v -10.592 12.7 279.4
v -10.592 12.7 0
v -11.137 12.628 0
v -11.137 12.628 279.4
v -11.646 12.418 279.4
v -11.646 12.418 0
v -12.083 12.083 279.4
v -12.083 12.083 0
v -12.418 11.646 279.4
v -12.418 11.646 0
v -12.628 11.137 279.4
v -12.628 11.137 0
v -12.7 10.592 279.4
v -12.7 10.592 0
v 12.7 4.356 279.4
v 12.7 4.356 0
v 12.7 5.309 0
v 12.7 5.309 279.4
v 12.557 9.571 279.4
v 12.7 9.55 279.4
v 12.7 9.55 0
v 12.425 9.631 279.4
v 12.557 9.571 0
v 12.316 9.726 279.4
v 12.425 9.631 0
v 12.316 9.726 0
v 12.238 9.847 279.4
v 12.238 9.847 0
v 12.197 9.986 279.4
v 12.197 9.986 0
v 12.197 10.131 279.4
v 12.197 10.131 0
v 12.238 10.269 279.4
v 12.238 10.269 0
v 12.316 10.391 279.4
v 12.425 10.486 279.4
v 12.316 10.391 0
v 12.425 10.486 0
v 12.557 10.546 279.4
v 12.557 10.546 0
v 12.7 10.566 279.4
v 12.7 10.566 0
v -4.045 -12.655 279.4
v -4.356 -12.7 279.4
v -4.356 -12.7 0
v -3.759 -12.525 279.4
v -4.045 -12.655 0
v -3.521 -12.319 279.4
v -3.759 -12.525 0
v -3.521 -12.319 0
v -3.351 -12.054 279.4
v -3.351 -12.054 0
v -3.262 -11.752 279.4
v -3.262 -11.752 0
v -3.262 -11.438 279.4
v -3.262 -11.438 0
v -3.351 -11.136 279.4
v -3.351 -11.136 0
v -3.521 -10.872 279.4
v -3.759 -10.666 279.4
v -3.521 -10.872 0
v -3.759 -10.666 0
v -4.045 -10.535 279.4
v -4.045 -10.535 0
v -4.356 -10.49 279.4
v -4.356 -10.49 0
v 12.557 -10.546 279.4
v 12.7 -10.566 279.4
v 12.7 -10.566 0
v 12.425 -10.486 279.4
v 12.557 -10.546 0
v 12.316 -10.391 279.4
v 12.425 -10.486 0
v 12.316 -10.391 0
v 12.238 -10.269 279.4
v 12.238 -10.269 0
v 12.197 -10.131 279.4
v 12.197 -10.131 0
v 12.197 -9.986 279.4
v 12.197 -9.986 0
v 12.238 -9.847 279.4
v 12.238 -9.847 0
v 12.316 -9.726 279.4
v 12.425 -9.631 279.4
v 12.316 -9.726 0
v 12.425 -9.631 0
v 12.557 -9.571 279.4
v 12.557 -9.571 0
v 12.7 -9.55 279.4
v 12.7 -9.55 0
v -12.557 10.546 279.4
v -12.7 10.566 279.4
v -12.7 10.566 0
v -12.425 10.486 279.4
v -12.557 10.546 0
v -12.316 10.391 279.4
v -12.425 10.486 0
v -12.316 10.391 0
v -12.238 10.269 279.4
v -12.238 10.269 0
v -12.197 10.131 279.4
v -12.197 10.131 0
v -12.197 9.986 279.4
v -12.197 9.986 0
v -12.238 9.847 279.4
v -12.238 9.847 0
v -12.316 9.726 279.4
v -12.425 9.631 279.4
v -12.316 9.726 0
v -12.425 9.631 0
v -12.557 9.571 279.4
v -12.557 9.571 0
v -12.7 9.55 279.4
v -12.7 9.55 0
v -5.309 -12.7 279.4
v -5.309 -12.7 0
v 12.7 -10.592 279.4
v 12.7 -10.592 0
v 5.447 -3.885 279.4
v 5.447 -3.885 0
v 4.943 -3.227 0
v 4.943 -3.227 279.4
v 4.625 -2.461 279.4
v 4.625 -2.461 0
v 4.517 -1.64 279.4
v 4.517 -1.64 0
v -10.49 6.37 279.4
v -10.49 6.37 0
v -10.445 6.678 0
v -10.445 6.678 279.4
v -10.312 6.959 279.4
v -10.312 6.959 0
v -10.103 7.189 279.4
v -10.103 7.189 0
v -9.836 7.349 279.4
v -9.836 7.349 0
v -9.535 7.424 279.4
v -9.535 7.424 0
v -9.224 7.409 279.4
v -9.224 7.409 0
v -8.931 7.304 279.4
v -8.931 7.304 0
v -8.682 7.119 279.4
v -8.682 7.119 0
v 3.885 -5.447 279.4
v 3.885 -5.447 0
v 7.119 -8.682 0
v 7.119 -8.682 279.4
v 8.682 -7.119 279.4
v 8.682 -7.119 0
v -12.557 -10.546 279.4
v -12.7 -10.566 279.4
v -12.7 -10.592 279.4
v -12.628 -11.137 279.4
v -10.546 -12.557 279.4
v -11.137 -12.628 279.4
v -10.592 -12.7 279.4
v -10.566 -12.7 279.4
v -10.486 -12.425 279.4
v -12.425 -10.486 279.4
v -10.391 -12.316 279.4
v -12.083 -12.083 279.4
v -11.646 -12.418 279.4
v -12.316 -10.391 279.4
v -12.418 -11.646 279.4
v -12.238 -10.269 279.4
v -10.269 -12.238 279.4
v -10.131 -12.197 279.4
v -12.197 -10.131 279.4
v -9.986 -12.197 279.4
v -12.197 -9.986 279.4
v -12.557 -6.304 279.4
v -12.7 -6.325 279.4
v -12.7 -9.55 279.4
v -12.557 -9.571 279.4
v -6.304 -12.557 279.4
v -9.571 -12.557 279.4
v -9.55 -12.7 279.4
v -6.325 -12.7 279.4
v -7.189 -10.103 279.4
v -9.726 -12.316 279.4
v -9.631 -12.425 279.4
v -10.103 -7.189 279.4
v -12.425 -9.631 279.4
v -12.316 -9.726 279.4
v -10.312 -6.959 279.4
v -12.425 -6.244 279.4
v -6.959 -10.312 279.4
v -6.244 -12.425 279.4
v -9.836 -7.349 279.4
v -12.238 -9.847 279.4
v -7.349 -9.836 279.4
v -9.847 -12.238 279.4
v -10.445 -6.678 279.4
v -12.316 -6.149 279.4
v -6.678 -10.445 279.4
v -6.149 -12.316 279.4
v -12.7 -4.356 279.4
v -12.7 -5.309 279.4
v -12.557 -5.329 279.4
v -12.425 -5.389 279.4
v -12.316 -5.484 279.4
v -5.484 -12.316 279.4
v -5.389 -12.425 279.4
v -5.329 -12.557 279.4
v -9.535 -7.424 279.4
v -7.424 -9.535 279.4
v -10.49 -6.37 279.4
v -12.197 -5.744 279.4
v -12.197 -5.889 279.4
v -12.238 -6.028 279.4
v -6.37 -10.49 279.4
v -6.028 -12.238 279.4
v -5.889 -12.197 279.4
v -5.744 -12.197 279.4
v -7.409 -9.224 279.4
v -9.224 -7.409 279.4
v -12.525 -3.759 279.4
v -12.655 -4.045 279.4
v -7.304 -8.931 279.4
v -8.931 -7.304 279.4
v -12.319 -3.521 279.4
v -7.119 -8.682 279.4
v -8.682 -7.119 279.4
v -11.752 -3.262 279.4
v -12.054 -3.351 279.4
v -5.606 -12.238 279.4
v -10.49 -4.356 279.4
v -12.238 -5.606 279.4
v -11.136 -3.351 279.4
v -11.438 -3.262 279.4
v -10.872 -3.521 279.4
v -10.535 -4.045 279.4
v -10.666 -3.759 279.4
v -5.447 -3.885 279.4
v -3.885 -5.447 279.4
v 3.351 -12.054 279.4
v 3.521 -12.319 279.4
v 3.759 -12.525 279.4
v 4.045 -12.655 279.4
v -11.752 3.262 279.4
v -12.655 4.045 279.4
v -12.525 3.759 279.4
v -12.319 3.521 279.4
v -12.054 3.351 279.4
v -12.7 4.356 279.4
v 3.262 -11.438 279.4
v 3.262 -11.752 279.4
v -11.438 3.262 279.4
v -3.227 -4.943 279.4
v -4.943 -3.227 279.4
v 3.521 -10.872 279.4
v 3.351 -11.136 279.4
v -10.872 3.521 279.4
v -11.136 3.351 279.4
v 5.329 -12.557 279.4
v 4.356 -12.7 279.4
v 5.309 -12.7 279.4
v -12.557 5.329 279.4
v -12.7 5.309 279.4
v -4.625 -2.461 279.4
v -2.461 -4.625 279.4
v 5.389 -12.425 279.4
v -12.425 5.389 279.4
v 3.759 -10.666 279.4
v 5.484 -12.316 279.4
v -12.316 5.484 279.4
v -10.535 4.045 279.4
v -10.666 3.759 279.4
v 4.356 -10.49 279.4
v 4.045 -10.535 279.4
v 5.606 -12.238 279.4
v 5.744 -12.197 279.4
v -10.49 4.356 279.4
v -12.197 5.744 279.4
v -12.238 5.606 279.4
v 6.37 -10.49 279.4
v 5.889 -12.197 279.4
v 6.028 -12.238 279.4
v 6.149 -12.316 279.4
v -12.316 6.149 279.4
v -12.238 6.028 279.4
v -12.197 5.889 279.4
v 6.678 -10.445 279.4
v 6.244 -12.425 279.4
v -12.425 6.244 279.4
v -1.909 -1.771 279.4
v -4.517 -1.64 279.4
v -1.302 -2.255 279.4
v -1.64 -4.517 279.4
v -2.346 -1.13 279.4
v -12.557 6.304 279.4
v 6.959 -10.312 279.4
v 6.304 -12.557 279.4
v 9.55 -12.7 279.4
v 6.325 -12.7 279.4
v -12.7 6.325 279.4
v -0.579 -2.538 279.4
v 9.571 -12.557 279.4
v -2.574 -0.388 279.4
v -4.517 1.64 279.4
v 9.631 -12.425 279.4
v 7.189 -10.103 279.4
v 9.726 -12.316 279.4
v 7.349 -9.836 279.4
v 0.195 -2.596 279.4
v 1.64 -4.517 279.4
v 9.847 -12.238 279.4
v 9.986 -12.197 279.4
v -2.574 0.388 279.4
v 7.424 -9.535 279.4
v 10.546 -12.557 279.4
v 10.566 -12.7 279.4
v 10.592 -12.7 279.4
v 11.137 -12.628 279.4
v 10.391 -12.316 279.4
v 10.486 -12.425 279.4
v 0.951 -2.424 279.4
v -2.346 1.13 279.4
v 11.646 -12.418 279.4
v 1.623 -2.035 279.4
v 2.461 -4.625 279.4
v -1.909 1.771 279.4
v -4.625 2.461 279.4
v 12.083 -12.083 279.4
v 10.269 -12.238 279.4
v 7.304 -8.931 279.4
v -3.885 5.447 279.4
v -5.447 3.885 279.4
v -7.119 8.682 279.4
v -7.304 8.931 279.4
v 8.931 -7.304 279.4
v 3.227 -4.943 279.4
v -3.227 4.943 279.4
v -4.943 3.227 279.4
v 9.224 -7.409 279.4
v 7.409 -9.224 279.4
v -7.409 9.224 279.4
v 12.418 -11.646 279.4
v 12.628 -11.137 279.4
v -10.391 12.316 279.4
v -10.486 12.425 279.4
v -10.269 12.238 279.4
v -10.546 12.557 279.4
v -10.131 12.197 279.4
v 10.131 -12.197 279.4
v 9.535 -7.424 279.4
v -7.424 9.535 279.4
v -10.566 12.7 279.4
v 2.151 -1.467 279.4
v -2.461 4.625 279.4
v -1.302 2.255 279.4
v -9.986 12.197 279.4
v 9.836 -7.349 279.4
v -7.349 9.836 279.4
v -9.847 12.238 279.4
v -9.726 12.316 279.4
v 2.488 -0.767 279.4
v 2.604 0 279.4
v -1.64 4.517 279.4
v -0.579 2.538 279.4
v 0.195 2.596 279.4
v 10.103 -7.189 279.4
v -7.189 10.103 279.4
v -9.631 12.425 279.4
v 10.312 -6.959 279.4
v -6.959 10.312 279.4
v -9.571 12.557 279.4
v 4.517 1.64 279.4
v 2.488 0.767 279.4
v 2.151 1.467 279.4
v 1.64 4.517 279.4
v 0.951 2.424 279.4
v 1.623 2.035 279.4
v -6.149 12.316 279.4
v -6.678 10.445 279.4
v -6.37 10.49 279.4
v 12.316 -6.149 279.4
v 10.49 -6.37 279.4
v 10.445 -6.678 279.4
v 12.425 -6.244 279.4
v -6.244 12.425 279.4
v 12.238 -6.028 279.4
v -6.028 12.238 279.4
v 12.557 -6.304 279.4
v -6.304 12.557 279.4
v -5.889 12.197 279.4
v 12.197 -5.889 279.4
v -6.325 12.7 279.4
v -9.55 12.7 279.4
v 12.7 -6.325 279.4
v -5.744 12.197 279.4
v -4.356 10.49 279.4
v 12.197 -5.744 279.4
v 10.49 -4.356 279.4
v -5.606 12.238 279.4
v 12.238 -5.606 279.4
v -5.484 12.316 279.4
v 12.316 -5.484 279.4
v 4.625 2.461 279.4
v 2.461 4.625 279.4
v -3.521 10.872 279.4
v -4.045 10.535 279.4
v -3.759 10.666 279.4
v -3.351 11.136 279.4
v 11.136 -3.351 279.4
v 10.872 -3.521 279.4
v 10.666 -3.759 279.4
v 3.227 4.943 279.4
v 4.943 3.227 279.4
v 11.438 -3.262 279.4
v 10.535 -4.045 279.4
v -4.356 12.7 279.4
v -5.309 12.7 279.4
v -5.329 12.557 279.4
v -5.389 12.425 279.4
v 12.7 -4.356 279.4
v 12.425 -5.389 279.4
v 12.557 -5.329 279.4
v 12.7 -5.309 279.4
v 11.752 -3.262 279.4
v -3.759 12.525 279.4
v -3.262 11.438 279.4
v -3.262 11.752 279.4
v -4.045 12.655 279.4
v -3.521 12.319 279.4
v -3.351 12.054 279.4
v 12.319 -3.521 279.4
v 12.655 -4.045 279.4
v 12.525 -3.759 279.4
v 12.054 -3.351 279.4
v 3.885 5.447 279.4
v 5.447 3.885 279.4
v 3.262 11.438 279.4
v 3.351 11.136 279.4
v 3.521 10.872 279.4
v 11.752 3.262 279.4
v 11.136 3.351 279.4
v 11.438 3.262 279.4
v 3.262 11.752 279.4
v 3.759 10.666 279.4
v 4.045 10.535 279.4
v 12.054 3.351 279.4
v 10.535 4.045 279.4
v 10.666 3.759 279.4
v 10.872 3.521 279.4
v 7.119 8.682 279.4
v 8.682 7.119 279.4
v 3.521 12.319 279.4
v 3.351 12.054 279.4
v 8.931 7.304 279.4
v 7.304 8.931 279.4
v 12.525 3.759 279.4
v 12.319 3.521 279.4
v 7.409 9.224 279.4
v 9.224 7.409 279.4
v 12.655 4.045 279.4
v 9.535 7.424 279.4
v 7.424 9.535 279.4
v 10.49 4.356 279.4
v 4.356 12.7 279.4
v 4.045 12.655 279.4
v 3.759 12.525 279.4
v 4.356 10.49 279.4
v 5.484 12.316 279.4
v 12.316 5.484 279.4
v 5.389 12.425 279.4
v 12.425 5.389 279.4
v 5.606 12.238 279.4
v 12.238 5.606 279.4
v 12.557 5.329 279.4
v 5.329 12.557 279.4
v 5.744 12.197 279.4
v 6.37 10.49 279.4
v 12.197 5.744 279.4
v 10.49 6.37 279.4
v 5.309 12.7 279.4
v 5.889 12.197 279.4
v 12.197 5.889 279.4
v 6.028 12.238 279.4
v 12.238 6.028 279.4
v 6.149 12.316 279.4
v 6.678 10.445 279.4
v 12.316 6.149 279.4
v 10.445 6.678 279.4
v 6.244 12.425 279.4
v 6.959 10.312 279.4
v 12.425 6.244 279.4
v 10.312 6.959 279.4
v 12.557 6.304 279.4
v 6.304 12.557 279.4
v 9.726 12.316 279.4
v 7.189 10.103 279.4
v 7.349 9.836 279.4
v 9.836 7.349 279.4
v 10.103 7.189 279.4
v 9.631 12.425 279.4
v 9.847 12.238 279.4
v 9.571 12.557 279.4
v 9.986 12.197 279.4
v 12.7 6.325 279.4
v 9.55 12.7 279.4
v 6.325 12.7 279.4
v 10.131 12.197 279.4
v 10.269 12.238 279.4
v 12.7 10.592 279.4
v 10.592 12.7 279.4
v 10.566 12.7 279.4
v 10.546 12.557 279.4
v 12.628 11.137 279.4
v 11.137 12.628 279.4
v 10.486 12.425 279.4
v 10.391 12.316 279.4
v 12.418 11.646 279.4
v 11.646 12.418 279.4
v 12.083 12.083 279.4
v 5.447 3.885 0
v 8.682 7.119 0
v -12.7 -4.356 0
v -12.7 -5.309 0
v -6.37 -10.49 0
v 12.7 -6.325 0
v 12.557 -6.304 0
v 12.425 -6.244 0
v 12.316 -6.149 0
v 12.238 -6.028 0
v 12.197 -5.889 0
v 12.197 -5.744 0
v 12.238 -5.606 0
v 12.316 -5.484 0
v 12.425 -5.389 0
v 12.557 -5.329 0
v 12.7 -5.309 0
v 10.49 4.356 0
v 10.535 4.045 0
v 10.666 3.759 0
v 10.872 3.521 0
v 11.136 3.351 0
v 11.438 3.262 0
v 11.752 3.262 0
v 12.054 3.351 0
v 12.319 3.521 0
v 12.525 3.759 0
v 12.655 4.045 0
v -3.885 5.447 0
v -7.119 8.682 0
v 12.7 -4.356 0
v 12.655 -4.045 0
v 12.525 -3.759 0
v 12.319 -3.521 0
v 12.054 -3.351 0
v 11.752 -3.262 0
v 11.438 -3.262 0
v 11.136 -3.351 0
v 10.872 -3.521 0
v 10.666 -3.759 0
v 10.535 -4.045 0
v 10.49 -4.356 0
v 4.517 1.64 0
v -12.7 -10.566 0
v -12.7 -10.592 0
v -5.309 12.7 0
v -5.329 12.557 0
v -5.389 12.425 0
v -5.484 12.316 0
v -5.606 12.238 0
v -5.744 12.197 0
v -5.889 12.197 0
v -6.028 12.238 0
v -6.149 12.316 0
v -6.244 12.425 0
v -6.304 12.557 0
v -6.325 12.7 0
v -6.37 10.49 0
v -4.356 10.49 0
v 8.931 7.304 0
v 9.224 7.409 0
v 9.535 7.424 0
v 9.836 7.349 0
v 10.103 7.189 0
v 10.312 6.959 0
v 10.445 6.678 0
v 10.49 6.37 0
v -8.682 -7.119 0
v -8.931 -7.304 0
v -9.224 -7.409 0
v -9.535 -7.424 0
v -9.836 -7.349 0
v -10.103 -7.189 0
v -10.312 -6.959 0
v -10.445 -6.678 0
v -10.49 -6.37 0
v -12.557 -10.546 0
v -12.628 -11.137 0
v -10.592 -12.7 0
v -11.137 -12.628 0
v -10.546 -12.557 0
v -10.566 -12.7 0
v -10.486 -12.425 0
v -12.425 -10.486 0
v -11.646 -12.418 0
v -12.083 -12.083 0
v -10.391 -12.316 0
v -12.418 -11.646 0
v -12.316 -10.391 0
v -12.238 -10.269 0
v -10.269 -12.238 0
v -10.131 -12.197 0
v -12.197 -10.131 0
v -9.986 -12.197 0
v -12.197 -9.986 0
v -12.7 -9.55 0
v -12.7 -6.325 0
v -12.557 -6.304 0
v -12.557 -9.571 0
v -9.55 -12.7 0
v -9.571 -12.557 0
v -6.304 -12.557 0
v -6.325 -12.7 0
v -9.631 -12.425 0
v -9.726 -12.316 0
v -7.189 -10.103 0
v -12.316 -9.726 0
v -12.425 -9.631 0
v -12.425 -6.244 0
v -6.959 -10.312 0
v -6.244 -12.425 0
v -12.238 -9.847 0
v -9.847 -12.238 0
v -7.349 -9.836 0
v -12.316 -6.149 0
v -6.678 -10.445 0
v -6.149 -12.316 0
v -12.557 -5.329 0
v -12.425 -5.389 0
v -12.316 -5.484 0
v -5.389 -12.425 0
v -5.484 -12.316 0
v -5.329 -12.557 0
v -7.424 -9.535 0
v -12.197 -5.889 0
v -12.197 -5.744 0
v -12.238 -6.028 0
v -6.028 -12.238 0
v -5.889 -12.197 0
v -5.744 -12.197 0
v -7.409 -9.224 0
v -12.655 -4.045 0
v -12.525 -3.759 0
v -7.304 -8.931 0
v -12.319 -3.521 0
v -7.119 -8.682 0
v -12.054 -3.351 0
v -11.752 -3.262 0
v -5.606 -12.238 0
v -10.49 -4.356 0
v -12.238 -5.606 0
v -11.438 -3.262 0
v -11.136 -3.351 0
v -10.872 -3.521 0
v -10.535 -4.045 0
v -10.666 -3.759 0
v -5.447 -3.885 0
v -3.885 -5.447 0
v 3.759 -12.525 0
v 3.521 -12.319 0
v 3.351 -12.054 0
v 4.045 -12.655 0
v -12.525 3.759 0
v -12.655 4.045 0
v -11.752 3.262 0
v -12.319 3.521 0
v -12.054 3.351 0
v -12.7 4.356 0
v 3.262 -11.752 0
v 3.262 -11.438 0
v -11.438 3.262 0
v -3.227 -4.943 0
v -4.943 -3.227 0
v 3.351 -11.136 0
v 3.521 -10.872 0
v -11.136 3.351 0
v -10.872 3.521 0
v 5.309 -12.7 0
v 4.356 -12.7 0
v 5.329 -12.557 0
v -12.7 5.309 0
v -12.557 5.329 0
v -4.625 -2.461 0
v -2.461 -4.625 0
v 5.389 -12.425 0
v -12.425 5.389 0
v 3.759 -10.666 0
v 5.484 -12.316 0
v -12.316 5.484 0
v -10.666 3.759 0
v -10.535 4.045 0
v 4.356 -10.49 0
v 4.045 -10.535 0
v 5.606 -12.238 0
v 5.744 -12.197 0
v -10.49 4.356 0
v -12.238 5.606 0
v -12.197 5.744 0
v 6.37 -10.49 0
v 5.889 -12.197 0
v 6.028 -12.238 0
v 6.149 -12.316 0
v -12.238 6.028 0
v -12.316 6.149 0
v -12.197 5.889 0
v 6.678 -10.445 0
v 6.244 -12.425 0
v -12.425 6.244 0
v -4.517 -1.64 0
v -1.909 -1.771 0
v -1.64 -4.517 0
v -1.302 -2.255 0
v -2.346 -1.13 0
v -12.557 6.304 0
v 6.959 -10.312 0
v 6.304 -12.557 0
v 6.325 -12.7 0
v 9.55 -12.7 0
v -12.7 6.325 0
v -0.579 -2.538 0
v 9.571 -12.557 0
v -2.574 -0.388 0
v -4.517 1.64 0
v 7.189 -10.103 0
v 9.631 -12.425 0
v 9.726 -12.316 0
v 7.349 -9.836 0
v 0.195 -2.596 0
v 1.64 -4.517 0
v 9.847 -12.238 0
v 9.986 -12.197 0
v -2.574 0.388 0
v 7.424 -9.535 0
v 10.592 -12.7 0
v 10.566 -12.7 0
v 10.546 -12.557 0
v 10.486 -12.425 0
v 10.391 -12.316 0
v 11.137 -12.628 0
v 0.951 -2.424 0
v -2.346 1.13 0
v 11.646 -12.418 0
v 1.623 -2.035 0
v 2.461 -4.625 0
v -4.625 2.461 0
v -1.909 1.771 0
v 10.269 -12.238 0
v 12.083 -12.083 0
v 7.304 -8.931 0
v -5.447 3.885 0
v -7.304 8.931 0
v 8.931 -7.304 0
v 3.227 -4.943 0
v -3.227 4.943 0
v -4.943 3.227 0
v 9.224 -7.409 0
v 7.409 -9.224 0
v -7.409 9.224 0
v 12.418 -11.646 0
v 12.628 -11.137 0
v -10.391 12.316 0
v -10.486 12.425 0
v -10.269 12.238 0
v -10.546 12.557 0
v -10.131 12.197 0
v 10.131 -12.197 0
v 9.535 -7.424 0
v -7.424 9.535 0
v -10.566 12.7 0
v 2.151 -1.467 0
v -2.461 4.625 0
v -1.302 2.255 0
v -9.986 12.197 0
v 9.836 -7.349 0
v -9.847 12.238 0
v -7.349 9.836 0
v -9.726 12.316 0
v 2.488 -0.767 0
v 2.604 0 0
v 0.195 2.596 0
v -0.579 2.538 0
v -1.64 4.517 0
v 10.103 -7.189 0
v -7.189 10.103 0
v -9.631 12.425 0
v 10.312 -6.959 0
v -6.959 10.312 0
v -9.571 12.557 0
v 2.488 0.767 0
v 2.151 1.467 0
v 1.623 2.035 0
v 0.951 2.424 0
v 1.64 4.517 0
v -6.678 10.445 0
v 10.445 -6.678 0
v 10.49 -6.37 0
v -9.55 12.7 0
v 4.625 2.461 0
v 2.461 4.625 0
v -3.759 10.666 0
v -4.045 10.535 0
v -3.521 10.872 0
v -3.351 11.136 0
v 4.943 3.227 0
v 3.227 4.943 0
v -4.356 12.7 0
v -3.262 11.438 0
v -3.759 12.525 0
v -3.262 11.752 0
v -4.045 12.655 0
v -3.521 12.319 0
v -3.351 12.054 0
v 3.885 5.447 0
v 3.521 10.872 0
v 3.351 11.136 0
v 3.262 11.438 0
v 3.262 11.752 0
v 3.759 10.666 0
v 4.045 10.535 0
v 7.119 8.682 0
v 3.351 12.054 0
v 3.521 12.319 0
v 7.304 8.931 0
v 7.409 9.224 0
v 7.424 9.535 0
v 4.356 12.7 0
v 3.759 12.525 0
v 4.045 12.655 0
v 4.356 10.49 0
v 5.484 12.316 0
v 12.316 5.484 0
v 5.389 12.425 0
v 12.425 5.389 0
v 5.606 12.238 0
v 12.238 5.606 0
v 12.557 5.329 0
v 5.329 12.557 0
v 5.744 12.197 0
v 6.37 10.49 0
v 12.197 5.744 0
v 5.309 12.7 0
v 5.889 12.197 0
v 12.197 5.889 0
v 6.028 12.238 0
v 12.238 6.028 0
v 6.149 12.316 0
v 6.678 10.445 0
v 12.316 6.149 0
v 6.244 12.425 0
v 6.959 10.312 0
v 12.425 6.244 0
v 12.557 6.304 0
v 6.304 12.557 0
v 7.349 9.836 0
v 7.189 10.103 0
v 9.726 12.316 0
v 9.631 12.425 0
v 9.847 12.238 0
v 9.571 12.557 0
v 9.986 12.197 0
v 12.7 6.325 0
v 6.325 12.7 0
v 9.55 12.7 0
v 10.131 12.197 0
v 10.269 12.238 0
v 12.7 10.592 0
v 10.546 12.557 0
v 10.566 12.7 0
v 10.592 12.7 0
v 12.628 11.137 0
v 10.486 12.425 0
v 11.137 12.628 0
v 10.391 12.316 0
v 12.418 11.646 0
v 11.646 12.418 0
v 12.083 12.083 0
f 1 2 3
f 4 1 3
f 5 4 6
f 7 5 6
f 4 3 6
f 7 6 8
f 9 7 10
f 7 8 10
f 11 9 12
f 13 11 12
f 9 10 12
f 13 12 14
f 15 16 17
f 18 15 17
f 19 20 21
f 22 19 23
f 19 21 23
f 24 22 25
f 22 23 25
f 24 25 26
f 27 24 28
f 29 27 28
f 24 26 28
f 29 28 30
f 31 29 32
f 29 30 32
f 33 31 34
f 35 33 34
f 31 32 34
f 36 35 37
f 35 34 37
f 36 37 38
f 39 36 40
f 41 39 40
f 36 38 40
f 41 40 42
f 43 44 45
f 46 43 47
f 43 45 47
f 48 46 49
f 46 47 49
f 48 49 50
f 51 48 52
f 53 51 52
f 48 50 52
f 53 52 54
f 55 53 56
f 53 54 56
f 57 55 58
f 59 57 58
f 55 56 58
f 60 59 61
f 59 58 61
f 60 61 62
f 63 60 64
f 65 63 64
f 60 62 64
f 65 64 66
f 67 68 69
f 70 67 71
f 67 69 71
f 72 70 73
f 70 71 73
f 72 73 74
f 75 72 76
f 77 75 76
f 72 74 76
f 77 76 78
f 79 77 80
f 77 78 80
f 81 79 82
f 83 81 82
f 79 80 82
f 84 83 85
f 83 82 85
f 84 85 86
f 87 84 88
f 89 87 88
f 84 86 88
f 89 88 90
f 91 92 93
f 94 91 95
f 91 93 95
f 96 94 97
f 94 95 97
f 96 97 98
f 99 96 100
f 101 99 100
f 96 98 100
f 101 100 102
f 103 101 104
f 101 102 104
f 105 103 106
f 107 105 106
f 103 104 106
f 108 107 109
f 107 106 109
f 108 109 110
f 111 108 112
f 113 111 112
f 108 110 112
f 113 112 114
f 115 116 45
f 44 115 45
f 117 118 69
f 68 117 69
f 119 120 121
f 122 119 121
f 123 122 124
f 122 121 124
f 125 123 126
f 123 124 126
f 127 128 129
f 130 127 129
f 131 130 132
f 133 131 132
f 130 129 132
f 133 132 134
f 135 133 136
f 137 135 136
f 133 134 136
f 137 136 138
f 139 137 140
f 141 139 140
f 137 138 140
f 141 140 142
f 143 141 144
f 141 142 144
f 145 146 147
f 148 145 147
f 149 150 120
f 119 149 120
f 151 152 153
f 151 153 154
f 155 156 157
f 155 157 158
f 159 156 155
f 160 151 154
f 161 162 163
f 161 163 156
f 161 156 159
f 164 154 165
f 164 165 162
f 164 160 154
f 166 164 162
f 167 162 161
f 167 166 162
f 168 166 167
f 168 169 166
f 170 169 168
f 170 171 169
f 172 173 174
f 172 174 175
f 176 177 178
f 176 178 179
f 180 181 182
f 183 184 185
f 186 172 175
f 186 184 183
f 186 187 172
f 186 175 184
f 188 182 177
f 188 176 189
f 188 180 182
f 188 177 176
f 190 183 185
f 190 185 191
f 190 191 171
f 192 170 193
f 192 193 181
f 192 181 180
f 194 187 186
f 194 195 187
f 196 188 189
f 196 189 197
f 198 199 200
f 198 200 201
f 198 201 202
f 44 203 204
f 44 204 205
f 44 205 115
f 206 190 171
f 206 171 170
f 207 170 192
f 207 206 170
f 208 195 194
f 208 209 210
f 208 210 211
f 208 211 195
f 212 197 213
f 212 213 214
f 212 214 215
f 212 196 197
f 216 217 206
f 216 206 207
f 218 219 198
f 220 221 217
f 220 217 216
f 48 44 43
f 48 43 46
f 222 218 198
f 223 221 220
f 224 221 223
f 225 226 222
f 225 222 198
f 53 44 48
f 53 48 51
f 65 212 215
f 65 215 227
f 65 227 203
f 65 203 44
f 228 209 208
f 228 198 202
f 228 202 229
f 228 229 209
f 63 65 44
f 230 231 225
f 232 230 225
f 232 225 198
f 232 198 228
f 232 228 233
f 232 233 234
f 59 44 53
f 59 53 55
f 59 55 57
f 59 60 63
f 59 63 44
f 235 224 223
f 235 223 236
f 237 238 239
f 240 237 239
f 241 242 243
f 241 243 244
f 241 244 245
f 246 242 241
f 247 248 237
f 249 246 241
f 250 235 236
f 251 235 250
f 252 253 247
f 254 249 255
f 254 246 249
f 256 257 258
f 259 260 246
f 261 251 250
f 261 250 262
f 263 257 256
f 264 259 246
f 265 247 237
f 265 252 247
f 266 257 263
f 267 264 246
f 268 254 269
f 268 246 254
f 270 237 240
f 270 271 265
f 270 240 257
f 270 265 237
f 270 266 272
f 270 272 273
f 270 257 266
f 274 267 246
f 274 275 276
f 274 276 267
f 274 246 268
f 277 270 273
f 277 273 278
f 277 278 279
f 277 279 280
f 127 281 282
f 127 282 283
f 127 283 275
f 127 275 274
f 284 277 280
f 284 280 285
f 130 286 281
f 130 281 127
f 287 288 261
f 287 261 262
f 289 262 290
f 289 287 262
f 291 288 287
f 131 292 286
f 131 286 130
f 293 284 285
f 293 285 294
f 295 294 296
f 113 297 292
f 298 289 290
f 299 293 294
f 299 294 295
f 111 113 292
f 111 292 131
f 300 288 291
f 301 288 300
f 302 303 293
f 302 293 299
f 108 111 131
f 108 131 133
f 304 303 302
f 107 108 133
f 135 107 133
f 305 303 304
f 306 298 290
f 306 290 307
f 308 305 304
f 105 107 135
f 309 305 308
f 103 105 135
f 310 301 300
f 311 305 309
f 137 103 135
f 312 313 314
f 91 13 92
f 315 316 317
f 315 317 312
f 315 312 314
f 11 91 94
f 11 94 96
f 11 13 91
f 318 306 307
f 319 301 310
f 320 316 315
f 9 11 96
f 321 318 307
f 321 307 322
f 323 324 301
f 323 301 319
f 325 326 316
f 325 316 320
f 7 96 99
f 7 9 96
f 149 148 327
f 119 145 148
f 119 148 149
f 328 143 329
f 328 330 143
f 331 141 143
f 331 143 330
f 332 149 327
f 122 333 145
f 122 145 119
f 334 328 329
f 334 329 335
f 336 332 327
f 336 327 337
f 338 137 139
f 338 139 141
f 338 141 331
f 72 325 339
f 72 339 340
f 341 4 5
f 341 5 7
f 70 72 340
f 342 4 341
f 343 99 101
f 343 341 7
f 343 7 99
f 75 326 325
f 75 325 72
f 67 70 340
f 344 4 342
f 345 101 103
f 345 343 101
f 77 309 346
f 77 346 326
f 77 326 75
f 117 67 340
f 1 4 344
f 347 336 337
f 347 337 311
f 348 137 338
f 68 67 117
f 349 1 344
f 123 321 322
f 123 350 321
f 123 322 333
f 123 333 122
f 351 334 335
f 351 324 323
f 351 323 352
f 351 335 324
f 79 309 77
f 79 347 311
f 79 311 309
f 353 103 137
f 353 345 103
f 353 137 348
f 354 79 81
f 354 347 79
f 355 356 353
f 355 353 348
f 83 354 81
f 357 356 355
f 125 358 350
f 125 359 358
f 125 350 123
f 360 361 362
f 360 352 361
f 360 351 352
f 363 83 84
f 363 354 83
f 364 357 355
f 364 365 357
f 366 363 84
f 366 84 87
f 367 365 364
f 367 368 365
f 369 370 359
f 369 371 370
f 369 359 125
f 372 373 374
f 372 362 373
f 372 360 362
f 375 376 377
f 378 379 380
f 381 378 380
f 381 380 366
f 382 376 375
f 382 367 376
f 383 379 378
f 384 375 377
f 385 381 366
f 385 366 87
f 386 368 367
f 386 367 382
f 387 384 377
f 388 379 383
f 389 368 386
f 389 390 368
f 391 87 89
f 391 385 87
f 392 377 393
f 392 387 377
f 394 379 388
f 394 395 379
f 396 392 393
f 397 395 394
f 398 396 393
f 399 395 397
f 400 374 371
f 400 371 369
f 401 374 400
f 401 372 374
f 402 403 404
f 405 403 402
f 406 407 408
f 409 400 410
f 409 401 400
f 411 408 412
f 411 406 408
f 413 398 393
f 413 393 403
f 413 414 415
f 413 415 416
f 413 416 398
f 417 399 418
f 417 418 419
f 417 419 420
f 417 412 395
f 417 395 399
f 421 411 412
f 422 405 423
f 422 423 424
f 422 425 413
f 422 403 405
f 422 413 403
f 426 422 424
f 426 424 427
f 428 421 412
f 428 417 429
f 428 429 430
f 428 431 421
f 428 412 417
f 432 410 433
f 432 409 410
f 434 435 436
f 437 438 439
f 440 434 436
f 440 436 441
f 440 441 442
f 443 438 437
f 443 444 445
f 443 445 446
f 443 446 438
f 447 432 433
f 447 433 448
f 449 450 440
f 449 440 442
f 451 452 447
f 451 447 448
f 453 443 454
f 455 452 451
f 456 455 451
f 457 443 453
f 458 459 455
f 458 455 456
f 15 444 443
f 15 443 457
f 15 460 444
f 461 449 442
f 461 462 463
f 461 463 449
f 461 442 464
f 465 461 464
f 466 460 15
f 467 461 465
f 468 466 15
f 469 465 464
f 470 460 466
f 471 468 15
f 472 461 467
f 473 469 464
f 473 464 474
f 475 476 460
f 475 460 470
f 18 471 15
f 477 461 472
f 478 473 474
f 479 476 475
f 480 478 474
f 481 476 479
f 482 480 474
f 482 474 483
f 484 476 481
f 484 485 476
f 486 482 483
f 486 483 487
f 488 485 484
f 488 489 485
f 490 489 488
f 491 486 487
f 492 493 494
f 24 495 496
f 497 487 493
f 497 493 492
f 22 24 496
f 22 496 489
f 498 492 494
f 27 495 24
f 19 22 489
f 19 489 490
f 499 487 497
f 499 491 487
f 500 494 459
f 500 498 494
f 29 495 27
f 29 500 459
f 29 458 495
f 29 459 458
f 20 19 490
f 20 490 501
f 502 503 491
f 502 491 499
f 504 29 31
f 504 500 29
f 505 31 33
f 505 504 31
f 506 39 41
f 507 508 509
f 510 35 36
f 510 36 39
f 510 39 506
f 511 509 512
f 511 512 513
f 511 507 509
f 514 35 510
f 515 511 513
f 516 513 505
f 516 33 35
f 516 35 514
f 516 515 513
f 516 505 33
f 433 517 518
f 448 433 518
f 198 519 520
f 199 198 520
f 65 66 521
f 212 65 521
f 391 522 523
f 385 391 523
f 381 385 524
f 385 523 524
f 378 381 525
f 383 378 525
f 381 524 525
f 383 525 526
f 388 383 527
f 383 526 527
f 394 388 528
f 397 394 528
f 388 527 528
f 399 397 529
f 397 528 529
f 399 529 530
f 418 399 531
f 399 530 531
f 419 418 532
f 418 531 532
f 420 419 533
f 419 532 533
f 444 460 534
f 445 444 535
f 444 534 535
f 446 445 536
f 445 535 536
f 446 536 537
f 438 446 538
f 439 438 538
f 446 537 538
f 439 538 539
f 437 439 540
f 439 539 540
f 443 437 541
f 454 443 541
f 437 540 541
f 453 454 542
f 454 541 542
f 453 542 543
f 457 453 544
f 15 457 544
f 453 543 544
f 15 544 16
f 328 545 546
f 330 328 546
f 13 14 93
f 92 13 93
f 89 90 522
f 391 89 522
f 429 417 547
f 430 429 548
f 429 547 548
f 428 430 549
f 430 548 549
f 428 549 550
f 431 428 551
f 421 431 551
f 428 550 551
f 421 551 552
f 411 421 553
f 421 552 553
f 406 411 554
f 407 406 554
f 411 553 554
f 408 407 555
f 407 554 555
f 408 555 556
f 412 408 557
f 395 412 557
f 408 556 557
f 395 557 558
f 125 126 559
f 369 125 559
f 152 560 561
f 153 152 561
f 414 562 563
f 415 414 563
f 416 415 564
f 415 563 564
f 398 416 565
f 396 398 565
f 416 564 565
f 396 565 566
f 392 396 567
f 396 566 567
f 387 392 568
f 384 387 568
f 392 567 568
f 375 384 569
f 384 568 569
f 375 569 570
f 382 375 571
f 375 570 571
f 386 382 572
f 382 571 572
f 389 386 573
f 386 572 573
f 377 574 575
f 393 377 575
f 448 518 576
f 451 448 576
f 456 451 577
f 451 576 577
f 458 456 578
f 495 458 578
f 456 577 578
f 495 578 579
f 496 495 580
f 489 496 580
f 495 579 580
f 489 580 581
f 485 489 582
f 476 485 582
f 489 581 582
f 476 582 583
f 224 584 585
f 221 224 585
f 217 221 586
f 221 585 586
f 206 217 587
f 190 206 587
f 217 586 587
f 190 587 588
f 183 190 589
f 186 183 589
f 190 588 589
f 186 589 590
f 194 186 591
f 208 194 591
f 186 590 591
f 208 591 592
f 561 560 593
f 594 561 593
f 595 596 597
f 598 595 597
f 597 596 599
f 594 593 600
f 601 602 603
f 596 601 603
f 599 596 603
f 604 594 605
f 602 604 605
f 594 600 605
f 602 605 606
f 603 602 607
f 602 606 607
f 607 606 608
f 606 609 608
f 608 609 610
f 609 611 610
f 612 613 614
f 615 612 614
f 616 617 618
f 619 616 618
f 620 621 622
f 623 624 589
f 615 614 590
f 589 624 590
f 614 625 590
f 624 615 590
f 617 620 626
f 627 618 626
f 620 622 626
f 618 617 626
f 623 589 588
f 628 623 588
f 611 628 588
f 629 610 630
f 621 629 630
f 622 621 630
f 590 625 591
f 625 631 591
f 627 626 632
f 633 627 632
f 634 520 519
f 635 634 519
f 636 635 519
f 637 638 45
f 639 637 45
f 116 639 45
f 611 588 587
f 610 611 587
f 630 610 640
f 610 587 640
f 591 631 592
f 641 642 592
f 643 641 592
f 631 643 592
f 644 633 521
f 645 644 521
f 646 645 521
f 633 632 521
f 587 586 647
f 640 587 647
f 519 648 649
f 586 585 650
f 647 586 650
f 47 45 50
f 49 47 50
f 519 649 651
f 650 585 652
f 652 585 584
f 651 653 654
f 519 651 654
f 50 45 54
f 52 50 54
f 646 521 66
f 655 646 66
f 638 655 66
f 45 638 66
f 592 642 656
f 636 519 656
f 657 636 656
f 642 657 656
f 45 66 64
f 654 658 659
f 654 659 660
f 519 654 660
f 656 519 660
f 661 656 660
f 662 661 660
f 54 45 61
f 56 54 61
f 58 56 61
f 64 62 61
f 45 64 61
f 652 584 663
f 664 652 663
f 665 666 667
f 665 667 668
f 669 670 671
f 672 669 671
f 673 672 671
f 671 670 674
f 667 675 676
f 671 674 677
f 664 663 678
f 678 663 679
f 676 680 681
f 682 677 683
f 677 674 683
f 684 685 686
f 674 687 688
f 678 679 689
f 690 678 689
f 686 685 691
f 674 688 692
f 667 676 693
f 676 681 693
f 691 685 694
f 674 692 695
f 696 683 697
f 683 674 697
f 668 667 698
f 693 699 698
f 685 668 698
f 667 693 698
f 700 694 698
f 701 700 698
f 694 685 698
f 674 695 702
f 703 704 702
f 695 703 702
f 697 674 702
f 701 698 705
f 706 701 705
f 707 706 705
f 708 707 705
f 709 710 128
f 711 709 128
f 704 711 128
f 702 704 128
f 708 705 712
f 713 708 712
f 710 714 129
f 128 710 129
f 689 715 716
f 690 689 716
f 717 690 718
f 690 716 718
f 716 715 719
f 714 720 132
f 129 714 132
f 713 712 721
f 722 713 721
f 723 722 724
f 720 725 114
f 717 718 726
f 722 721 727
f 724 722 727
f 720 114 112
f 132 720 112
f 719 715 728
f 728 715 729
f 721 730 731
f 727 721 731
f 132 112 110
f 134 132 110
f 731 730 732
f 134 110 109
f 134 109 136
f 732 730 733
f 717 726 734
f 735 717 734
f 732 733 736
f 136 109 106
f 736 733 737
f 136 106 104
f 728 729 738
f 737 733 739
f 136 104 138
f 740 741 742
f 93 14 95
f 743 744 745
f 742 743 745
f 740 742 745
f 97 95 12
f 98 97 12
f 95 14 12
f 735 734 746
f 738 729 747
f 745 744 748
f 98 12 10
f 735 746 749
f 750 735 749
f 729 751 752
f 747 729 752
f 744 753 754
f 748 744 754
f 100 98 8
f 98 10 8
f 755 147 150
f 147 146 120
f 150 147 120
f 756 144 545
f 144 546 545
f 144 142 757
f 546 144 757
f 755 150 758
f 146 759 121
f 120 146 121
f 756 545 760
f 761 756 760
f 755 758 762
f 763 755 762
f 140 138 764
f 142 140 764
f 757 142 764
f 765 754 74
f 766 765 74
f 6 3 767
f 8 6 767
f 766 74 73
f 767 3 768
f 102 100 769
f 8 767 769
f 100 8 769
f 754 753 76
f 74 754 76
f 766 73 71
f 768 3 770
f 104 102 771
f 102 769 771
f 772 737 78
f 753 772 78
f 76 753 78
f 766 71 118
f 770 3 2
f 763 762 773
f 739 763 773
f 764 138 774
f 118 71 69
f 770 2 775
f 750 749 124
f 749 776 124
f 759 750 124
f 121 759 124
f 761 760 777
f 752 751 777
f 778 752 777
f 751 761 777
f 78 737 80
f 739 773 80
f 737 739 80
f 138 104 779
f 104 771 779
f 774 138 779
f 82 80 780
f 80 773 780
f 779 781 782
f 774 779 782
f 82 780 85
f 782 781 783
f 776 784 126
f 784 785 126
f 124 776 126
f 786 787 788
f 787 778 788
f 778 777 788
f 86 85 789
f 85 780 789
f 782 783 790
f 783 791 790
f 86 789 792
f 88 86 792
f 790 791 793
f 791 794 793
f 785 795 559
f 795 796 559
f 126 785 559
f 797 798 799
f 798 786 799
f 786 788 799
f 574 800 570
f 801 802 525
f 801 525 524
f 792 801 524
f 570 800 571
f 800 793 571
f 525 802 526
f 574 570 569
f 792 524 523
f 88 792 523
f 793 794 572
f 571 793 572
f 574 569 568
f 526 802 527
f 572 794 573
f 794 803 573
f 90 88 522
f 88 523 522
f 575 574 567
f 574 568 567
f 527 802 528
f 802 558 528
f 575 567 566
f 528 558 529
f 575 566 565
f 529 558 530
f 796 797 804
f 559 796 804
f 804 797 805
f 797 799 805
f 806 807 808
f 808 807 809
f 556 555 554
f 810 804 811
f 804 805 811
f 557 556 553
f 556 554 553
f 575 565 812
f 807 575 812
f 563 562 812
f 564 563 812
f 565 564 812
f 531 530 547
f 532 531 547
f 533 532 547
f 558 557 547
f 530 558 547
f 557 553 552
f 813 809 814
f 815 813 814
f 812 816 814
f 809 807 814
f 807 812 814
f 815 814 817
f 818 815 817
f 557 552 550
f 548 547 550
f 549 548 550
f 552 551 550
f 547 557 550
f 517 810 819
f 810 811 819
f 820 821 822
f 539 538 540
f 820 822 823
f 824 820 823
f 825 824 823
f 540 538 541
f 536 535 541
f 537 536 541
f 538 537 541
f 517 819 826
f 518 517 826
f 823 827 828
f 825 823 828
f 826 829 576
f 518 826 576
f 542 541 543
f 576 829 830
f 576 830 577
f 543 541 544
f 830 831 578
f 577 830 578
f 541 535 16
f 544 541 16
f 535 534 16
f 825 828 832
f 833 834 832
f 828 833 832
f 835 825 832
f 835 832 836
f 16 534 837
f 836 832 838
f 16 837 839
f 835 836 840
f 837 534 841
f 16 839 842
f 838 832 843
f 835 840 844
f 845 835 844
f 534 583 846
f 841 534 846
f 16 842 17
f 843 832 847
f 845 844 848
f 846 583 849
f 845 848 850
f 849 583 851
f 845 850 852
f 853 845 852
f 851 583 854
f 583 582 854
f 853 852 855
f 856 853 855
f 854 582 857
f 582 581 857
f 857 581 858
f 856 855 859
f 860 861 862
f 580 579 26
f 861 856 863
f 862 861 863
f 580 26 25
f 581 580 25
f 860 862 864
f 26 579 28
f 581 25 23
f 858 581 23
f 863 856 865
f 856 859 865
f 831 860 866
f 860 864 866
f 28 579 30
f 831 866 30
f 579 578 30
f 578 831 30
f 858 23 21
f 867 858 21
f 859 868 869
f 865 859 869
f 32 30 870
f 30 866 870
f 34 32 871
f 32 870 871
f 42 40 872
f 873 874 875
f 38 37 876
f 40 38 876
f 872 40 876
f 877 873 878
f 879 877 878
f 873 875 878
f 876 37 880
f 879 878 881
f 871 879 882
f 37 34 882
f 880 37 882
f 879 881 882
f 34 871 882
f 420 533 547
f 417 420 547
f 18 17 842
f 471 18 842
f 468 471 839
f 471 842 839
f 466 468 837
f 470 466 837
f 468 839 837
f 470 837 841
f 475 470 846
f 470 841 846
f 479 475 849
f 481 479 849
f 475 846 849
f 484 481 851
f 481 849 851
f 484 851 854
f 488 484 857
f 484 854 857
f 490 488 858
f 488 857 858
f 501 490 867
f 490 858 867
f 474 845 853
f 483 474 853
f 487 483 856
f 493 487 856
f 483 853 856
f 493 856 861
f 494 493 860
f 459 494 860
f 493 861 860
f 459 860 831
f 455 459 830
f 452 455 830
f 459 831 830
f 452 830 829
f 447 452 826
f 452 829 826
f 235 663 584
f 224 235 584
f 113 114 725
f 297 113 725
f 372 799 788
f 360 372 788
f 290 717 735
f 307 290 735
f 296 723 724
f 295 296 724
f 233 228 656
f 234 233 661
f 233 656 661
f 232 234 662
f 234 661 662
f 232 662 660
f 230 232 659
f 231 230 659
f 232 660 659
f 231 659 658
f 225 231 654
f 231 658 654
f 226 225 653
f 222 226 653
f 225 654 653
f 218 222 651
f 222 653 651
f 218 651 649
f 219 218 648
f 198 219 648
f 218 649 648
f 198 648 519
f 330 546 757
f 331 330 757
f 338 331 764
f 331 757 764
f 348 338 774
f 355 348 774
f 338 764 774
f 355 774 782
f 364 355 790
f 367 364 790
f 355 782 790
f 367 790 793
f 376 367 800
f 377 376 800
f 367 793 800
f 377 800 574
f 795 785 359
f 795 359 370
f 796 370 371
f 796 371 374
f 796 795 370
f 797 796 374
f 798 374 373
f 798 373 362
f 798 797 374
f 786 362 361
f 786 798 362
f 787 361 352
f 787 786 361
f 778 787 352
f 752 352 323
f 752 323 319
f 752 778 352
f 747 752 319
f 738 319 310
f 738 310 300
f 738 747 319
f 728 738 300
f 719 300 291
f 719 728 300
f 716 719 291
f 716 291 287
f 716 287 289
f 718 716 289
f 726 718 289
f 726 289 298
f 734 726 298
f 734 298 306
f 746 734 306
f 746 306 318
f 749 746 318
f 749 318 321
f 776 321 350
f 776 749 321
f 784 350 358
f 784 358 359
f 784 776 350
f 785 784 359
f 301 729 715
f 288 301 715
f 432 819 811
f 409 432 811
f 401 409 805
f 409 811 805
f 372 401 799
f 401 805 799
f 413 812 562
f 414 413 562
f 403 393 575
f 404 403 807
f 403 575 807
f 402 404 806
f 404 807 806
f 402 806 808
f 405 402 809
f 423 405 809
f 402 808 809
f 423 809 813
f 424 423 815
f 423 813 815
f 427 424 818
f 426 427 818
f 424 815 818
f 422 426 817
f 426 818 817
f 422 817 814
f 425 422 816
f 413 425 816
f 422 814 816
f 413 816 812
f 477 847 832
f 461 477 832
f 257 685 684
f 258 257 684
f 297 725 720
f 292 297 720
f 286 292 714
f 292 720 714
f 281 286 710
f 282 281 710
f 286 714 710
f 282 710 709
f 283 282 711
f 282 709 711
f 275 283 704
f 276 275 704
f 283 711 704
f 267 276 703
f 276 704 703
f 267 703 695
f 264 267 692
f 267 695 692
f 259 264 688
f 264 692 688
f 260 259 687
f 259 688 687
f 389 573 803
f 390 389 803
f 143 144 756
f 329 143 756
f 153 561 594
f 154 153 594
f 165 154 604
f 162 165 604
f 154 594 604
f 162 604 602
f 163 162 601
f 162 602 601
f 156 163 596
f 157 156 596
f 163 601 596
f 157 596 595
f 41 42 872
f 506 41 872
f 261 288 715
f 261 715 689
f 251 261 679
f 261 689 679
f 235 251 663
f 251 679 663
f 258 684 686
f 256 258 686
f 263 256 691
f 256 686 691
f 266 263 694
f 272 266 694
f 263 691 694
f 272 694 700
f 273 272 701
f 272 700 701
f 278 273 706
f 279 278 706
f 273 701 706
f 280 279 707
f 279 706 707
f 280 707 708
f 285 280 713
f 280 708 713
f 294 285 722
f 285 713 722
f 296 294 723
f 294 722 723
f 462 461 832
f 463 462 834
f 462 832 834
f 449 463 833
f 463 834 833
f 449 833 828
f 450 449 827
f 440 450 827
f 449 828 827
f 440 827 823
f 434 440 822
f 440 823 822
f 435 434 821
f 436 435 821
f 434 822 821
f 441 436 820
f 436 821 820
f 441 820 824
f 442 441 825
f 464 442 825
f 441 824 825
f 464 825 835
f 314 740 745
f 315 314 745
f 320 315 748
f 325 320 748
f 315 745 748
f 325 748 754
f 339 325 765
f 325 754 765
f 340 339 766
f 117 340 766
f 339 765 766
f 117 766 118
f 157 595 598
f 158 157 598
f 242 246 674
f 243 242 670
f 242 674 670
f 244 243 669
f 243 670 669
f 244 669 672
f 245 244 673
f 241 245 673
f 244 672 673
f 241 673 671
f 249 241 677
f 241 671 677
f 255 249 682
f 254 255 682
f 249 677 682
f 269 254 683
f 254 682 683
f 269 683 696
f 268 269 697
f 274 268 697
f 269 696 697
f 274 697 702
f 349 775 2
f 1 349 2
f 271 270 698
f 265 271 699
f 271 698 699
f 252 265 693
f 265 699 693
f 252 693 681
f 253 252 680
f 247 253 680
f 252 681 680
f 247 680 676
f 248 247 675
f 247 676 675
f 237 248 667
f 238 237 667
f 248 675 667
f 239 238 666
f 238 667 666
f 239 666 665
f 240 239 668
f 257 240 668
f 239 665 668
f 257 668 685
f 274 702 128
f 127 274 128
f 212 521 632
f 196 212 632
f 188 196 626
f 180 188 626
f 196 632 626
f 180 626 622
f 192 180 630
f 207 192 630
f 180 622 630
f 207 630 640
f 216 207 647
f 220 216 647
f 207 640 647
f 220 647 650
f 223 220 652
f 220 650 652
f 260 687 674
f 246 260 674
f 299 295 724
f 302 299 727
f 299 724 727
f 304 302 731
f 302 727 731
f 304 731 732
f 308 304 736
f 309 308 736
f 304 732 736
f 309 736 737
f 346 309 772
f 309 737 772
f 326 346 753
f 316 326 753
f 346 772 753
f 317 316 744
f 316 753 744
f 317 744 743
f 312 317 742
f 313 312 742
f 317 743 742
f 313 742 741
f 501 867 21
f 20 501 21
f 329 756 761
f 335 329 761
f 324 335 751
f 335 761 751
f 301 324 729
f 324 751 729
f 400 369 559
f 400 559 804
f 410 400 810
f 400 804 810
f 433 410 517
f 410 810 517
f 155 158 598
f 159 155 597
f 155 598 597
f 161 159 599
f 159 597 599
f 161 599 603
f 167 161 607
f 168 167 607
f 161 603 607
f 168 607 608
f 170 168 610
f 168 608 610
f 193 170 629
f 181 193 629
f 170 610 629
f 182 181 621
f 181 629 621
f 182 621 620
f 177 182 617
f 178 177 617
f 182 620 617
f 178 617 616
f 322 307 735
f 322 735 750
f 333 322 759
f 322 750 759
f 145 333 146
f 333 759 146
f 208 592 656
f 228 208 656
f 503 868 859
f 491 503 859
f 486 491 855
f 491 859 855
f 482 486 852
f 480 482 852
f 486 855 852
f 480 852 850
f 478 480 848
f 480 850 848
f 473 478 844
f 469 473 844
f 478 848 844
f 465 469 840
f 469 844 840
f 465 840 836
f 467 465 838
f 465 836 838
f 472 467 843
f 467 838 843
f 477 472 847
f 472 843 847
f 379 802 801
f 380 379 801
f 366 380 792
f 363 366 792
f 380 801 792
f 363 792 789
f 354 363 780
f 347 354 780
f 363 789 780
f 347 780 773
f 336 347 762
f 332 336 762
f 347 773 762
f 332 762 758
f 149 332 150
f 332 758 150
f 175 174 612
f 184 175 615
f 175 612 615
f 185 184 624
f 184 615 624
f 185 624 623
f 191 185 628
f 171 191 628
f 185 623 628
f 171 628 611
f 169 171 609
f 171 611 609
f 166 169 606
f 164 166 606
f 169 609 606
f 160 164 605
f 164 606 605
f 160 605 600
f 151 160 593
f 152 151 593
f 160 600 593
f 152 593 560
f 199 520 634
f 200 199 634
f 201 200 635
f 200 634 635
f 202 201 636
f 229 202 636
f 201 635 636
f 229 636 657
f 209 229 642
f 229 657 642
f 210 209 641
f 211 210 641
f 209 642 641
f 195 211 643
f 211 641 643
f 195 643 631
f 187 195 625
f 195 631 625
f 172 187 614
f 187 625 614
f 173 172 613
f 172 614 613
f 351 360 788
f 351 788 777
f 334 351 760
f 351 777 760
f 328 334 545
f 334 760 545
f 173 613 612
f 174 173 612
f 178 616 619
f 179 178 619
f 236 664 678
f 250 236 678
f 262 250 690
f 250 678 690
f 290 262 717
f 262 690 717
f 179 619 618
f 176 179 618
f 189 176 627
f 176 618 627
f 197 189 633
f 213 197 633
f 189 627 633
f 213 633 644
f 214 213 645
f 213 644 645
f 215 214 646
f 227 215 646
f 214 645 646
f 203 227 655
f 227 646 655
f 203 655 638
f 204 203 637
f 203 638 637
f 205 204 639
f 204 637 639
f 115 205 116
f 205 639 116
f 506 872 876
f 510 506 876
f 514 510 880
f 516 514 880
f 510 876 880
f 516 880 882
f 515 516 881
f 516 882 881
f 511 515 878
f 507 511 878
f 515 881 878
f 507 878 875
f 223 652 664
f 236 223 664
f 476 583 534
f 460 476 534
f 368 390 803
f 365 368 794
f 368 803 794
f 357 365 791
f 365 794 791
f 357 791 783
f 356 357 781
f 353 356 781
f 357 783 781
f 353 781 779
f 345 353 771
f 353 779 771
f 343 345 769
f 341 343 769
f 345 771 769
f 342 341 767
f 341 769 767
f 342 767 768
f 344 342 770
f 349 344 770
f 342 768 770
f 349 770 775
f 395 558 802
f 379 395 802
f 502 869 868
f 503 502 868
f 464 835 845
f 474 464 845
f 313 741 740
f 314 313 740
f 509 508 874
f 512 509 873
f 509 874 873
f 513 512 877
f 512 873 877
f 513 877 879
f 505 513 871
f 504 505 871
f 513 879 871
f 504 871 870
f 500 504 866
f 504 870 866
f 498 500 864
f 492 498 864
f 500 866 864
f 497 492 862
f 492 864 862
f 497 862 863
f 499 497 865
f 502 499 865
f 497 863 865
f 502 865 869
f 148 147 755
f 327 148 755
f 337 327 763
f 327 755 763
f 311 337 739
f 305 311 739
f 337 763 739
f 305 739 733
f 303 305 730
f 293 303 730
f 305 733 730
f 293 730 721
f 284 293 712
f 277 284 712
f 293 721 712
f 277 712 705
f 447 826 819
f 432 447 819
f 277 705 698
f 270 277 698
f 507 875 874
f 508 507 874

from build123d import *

# Parameters (mm, degrees)
SKETCH1_R           = 2.6035
BOSS_EXTRUDE1_DEPTH = 279.4


with BuildPart() as part:
    # Sketch1 → Boss-Extrude1 (new body)
    with BuildSketch(Plane.XY):
        with BuildLine():
            Line((10.5918, 12.7), (10.5664, 12.7))
            ThreePointArc((10.5664, 12.7), (10.0584, 12.192), (9.5504, 12.7))
            Line((9.5504, 12.7), (6.3246, 12.7))
            ThreePointArc((6.3246, 12.7), (5.8166, 12.192), (5.3086, 12.7))
            Line((5.3086, 12.7), (4.3561, 12.7))
            ThreePointArc((4.3561, 12.7), (3.2512, 11.5951), (4.3561, 10.4902))
            Line((4.3561, 10.4902), (6.370083786, 10.4902))
            ThreePointArc((6.370083786, 10.4902), (7.348856743, 9.836204819), (7.119204175, 8.681663397))
            Line((7.119204175, 8.681663397), (3.88464389, 5.447103113))
            ThreePointArc((3.88464389, 5.447103113), (2.854599758, 4.758849627), (1.63957986, 4.517167143))
            Line((1.63957986, 4.517167143), (-1.63957986, 4.517167143))
            ThreePointArc((-1.63957986, 4.517167143), (-2.854599758, 4.758849627), (-3.88464389, 5.447103113))
            Line((-3.88464389, 5.447103113), (-7.119204175, 8.681663397))
            ThreePointArc((-7.119204175, 8.681663397), (-7.348856743, 9.836204819), (-6.370083786, 10.4902))
            Line((-6.370083786, 10.4902), (-4.3561, 10.4902))
            ThreePointArc((-4.3561, 10.4902), (-3.2512, 11.5951), (-4.3561, 12.7))
            Line((-4.3561, 12.7), (-5.3086, 12.7))
            ThreePointArc((-5.3086, 12.7), (-5.8166, 12.192), (-6.3246, 12.7))
            Line((-6.3246, 12.7), (-9.5504, 12.7))
            ThreePointArc((-9.5504, 12.7), (-10.0584, 12.192), (-10.5664, 12.7))
            Line((-10.5664, 12.7), (-10.5918, 12.7))
            ThreePointArc((-10.5918, 12.7), (-12.082522516, 12.082522516), (-12.7, 10.5918))
            Line((-12.7, 10.5918), (-12.7, 10.5664))
            ThreePointArc((-12.7, 10.5664), (-12.192, 10.0584), (-12.7, 9.5504))
            Line((-12.7, 9.5504), (-12.7, 6.3246))
            ThreePointArc((-12.7, 6.3246), (-12.192, 5.8166), (-12.7, 5.3086))
            Line((-12.7, 5.3086), (-12.7, 4.3561))
            ThreePointArc((-12.7, 4.3561), (-11.5951, 3.2512), (-10.4902, 4.3561))
            Line((-10.4902, 4.3561), (-10.4902, 6.370083786))
            ThreePointArc((-10.4902, 6.370083786), (-9.836204819, 7.348856743), (-8.681663397, 7.119204175))
            Line((-8.681663397, 7.119204175), (-5.447103113, 3.88464389))
            ThreePointArc((-5.447103113, 3.88464389), (-4.758849627, 2.854599758), (-4.517167143, 1.63957986))
            Line((-4.517167143, 1.63957986), (-4.517167143, -1.63957986))
            ThreePointArc((-4.517167143, -1.63957986), (-4.758849627, -2.854599758), (-5.447103113, -3.88464389))
            Line((-5.447103113, -3.88464389), (-8.681663397, -7.119204175))
            ThreePointArc((-8.681663397, -7.119204175), (-9.836204819, -7.348856743), (-10.4902, -6.370083786))
            Line((-10.4902, -6.370083786), (-10.4902, -4.3561))
            ThreePointArc((-10.4902, -4.3561), (-11.5951, -3.2512), (-12.7, -4.3561))
            Line((-12.7, -4.3561), (-12.7, -5.3086))
            ThreePointArc((-12.7, -5.3086), (-12.192, -5.8166), (-12.7, -6.3246))
            Line((-12.7, -6.3246), (-12.7, -9.5504))
            ThreePointArc((-12.7, -9.5504), (-12.192, -10.0584), (-12.7, -10.5664))
            Line((-12.7, -10.5664), (-12.7, -10.5918))
            ThreePointArc((-12.7, -10.5918), (-12.082522516, -12.082522516), (-10.5918, -12.7))
            Line((-10.5918, -12.7), (-10.5664, -12.7))
            ThreePointArc((-10.5664, -12.7), (-10.0584, -12.192), (-9.5504, -12.7))
            Line((-9.5504, -12.7), (-6.3246, -12.7))
            ThreePointArc((-6.3246, -12.7), (-5.8166, -12.192), (-5.3086, -12.7))
            Line((-5.3086, -12.7), (-4.3561, -12.7))
            ThreePointArc((-4.3561, -12.7), (-3.2512, -11.5951), (-4.3561, -10.4902))
            Line((-4.3561, -10.4902), (-6.370083786, -10.4902))
            ThreePointArc((-6.370083786, -10.4902), (-7.348856743, -9.836204819), (-7.119204175, -8.681663397))
            Line((-7.119204175, -8.681663397), (-3.88464389, -5.447103113))
            ThreePointArc((-3.88464389, -5.447103113), (-2.854599758, -4.758849627), (-1.63957986, -4.517167143))
            Line((-1.63957986, -4.517167143), (1.63957986, -4.517167143))
            ThreePointArc((1.63957986, -4.517167143), (2.854599758, -4.758849627), (3.88464389, -5.447103113))
            Line((3.88464389, -5.447103113), (7.119204175, -8.681663397))
            ThreePointArc((7.119204175, -8.681663397), (7.348856743, -9.836204819), (6.370083786, -10.4902))
            Line((6.370083786, -10.4902), (4.3561, -10.4902))
            ThreePointArc((4.3561, -10.4902), (3.2512, -11.5951), (4.3561, -12.7))
            Line((4.3561, -12.7), (5.3086, -12.7))
            ThreePointArc((5.3086, -12.7), (5.8166, -12.192), (6.3246, -12.7))
            Line((6.3246, -12.7), (9.5504, -12.7))
            ThreePointArc((9.5504, -12.7), (10.0584, -12.192), (10.5664, -12.7))
            Line((10.5664, -12.7), (10.5918, -12.7))
            ThreePointArc((10.5918, -12.7), (12.082522516, -12.082522516), (12.7, -10.5918))
            Line((12.7, -10.5918), (12.7, -10.5664))
            ThreePointArc((12.7, -10.5664), (12.192, -10.0584), (12.7, -9.5504))
            Line((12.7, -9.5504), (12.7, -6.3246))
            ThreePointArc((12.7, -6.3246), (12.192, -5.8166), (12.7, -5.3086))
            Line((12.7, -5.3086), (12.7, -4.3561))
            ThreePointArc((12.7, -4.3561), (11.5951, -3.2512), (10.4902, -4.3561))
            Line((10.4902, -4.3561), (10.4902, -6.370083786))
            ThreePointArc((10.4902, -6.370083786), (9.836204819, -7.348856743), (8.681663397, -7.119204175))
            Line((8.681663397, -7.119204175), (5.447103113, -3.88464389))
            ThreePointArc((5.447103113, -3.88464389), (4.758849627, -2.854599758), (4.517167143, -1.63957986))
            Line((4.517167143, -1.63957986), (4.517167143, 1.63957986))
            ThreePointArc((4.517167143, 1.63957986), (4.758849627, 2.854599758), (5.447103113, 3.88464389))
            Line((5.447103113, 3.88464389), (8.681663397, 7.119204175))
            ThreePointArc((8.681663397, 7.119204175), (9.836204819, 7.348856743), (10.4902, 6.370083786))
            Line((10.4902, 6.370083786), (10.4902, 4.3561))
            ThreePointArc((10.4902, 4.3561), (11.5951, 3.2512), (12.7, 4.3561))
            Line((12.7, 4.3561), (12.7, 5.3086))
            ThreePointArc((12.7, 5.3086), (12.192, 5.8166), (12.7, 6.3246))
            Line((12.7, 6.3246), (12.7, 9.5504))
            ThreePointArc((12.7, 9.5504), (12.192, 10.0584), (12.7, 10.5664))
            Line((12.7, 10.5664), (12.7, 10.5918))
            ThreePointArc((12.7, 10.5918), (12.082522516, 12.082522516), (10.5918, 12.7))
        make_face()
        Circle(SKETCH1_R, mode=Mode.SUBTRACT)
    extrude(amount=BOSS_EXTRUDE1_DEPTH)


solid = part.part
